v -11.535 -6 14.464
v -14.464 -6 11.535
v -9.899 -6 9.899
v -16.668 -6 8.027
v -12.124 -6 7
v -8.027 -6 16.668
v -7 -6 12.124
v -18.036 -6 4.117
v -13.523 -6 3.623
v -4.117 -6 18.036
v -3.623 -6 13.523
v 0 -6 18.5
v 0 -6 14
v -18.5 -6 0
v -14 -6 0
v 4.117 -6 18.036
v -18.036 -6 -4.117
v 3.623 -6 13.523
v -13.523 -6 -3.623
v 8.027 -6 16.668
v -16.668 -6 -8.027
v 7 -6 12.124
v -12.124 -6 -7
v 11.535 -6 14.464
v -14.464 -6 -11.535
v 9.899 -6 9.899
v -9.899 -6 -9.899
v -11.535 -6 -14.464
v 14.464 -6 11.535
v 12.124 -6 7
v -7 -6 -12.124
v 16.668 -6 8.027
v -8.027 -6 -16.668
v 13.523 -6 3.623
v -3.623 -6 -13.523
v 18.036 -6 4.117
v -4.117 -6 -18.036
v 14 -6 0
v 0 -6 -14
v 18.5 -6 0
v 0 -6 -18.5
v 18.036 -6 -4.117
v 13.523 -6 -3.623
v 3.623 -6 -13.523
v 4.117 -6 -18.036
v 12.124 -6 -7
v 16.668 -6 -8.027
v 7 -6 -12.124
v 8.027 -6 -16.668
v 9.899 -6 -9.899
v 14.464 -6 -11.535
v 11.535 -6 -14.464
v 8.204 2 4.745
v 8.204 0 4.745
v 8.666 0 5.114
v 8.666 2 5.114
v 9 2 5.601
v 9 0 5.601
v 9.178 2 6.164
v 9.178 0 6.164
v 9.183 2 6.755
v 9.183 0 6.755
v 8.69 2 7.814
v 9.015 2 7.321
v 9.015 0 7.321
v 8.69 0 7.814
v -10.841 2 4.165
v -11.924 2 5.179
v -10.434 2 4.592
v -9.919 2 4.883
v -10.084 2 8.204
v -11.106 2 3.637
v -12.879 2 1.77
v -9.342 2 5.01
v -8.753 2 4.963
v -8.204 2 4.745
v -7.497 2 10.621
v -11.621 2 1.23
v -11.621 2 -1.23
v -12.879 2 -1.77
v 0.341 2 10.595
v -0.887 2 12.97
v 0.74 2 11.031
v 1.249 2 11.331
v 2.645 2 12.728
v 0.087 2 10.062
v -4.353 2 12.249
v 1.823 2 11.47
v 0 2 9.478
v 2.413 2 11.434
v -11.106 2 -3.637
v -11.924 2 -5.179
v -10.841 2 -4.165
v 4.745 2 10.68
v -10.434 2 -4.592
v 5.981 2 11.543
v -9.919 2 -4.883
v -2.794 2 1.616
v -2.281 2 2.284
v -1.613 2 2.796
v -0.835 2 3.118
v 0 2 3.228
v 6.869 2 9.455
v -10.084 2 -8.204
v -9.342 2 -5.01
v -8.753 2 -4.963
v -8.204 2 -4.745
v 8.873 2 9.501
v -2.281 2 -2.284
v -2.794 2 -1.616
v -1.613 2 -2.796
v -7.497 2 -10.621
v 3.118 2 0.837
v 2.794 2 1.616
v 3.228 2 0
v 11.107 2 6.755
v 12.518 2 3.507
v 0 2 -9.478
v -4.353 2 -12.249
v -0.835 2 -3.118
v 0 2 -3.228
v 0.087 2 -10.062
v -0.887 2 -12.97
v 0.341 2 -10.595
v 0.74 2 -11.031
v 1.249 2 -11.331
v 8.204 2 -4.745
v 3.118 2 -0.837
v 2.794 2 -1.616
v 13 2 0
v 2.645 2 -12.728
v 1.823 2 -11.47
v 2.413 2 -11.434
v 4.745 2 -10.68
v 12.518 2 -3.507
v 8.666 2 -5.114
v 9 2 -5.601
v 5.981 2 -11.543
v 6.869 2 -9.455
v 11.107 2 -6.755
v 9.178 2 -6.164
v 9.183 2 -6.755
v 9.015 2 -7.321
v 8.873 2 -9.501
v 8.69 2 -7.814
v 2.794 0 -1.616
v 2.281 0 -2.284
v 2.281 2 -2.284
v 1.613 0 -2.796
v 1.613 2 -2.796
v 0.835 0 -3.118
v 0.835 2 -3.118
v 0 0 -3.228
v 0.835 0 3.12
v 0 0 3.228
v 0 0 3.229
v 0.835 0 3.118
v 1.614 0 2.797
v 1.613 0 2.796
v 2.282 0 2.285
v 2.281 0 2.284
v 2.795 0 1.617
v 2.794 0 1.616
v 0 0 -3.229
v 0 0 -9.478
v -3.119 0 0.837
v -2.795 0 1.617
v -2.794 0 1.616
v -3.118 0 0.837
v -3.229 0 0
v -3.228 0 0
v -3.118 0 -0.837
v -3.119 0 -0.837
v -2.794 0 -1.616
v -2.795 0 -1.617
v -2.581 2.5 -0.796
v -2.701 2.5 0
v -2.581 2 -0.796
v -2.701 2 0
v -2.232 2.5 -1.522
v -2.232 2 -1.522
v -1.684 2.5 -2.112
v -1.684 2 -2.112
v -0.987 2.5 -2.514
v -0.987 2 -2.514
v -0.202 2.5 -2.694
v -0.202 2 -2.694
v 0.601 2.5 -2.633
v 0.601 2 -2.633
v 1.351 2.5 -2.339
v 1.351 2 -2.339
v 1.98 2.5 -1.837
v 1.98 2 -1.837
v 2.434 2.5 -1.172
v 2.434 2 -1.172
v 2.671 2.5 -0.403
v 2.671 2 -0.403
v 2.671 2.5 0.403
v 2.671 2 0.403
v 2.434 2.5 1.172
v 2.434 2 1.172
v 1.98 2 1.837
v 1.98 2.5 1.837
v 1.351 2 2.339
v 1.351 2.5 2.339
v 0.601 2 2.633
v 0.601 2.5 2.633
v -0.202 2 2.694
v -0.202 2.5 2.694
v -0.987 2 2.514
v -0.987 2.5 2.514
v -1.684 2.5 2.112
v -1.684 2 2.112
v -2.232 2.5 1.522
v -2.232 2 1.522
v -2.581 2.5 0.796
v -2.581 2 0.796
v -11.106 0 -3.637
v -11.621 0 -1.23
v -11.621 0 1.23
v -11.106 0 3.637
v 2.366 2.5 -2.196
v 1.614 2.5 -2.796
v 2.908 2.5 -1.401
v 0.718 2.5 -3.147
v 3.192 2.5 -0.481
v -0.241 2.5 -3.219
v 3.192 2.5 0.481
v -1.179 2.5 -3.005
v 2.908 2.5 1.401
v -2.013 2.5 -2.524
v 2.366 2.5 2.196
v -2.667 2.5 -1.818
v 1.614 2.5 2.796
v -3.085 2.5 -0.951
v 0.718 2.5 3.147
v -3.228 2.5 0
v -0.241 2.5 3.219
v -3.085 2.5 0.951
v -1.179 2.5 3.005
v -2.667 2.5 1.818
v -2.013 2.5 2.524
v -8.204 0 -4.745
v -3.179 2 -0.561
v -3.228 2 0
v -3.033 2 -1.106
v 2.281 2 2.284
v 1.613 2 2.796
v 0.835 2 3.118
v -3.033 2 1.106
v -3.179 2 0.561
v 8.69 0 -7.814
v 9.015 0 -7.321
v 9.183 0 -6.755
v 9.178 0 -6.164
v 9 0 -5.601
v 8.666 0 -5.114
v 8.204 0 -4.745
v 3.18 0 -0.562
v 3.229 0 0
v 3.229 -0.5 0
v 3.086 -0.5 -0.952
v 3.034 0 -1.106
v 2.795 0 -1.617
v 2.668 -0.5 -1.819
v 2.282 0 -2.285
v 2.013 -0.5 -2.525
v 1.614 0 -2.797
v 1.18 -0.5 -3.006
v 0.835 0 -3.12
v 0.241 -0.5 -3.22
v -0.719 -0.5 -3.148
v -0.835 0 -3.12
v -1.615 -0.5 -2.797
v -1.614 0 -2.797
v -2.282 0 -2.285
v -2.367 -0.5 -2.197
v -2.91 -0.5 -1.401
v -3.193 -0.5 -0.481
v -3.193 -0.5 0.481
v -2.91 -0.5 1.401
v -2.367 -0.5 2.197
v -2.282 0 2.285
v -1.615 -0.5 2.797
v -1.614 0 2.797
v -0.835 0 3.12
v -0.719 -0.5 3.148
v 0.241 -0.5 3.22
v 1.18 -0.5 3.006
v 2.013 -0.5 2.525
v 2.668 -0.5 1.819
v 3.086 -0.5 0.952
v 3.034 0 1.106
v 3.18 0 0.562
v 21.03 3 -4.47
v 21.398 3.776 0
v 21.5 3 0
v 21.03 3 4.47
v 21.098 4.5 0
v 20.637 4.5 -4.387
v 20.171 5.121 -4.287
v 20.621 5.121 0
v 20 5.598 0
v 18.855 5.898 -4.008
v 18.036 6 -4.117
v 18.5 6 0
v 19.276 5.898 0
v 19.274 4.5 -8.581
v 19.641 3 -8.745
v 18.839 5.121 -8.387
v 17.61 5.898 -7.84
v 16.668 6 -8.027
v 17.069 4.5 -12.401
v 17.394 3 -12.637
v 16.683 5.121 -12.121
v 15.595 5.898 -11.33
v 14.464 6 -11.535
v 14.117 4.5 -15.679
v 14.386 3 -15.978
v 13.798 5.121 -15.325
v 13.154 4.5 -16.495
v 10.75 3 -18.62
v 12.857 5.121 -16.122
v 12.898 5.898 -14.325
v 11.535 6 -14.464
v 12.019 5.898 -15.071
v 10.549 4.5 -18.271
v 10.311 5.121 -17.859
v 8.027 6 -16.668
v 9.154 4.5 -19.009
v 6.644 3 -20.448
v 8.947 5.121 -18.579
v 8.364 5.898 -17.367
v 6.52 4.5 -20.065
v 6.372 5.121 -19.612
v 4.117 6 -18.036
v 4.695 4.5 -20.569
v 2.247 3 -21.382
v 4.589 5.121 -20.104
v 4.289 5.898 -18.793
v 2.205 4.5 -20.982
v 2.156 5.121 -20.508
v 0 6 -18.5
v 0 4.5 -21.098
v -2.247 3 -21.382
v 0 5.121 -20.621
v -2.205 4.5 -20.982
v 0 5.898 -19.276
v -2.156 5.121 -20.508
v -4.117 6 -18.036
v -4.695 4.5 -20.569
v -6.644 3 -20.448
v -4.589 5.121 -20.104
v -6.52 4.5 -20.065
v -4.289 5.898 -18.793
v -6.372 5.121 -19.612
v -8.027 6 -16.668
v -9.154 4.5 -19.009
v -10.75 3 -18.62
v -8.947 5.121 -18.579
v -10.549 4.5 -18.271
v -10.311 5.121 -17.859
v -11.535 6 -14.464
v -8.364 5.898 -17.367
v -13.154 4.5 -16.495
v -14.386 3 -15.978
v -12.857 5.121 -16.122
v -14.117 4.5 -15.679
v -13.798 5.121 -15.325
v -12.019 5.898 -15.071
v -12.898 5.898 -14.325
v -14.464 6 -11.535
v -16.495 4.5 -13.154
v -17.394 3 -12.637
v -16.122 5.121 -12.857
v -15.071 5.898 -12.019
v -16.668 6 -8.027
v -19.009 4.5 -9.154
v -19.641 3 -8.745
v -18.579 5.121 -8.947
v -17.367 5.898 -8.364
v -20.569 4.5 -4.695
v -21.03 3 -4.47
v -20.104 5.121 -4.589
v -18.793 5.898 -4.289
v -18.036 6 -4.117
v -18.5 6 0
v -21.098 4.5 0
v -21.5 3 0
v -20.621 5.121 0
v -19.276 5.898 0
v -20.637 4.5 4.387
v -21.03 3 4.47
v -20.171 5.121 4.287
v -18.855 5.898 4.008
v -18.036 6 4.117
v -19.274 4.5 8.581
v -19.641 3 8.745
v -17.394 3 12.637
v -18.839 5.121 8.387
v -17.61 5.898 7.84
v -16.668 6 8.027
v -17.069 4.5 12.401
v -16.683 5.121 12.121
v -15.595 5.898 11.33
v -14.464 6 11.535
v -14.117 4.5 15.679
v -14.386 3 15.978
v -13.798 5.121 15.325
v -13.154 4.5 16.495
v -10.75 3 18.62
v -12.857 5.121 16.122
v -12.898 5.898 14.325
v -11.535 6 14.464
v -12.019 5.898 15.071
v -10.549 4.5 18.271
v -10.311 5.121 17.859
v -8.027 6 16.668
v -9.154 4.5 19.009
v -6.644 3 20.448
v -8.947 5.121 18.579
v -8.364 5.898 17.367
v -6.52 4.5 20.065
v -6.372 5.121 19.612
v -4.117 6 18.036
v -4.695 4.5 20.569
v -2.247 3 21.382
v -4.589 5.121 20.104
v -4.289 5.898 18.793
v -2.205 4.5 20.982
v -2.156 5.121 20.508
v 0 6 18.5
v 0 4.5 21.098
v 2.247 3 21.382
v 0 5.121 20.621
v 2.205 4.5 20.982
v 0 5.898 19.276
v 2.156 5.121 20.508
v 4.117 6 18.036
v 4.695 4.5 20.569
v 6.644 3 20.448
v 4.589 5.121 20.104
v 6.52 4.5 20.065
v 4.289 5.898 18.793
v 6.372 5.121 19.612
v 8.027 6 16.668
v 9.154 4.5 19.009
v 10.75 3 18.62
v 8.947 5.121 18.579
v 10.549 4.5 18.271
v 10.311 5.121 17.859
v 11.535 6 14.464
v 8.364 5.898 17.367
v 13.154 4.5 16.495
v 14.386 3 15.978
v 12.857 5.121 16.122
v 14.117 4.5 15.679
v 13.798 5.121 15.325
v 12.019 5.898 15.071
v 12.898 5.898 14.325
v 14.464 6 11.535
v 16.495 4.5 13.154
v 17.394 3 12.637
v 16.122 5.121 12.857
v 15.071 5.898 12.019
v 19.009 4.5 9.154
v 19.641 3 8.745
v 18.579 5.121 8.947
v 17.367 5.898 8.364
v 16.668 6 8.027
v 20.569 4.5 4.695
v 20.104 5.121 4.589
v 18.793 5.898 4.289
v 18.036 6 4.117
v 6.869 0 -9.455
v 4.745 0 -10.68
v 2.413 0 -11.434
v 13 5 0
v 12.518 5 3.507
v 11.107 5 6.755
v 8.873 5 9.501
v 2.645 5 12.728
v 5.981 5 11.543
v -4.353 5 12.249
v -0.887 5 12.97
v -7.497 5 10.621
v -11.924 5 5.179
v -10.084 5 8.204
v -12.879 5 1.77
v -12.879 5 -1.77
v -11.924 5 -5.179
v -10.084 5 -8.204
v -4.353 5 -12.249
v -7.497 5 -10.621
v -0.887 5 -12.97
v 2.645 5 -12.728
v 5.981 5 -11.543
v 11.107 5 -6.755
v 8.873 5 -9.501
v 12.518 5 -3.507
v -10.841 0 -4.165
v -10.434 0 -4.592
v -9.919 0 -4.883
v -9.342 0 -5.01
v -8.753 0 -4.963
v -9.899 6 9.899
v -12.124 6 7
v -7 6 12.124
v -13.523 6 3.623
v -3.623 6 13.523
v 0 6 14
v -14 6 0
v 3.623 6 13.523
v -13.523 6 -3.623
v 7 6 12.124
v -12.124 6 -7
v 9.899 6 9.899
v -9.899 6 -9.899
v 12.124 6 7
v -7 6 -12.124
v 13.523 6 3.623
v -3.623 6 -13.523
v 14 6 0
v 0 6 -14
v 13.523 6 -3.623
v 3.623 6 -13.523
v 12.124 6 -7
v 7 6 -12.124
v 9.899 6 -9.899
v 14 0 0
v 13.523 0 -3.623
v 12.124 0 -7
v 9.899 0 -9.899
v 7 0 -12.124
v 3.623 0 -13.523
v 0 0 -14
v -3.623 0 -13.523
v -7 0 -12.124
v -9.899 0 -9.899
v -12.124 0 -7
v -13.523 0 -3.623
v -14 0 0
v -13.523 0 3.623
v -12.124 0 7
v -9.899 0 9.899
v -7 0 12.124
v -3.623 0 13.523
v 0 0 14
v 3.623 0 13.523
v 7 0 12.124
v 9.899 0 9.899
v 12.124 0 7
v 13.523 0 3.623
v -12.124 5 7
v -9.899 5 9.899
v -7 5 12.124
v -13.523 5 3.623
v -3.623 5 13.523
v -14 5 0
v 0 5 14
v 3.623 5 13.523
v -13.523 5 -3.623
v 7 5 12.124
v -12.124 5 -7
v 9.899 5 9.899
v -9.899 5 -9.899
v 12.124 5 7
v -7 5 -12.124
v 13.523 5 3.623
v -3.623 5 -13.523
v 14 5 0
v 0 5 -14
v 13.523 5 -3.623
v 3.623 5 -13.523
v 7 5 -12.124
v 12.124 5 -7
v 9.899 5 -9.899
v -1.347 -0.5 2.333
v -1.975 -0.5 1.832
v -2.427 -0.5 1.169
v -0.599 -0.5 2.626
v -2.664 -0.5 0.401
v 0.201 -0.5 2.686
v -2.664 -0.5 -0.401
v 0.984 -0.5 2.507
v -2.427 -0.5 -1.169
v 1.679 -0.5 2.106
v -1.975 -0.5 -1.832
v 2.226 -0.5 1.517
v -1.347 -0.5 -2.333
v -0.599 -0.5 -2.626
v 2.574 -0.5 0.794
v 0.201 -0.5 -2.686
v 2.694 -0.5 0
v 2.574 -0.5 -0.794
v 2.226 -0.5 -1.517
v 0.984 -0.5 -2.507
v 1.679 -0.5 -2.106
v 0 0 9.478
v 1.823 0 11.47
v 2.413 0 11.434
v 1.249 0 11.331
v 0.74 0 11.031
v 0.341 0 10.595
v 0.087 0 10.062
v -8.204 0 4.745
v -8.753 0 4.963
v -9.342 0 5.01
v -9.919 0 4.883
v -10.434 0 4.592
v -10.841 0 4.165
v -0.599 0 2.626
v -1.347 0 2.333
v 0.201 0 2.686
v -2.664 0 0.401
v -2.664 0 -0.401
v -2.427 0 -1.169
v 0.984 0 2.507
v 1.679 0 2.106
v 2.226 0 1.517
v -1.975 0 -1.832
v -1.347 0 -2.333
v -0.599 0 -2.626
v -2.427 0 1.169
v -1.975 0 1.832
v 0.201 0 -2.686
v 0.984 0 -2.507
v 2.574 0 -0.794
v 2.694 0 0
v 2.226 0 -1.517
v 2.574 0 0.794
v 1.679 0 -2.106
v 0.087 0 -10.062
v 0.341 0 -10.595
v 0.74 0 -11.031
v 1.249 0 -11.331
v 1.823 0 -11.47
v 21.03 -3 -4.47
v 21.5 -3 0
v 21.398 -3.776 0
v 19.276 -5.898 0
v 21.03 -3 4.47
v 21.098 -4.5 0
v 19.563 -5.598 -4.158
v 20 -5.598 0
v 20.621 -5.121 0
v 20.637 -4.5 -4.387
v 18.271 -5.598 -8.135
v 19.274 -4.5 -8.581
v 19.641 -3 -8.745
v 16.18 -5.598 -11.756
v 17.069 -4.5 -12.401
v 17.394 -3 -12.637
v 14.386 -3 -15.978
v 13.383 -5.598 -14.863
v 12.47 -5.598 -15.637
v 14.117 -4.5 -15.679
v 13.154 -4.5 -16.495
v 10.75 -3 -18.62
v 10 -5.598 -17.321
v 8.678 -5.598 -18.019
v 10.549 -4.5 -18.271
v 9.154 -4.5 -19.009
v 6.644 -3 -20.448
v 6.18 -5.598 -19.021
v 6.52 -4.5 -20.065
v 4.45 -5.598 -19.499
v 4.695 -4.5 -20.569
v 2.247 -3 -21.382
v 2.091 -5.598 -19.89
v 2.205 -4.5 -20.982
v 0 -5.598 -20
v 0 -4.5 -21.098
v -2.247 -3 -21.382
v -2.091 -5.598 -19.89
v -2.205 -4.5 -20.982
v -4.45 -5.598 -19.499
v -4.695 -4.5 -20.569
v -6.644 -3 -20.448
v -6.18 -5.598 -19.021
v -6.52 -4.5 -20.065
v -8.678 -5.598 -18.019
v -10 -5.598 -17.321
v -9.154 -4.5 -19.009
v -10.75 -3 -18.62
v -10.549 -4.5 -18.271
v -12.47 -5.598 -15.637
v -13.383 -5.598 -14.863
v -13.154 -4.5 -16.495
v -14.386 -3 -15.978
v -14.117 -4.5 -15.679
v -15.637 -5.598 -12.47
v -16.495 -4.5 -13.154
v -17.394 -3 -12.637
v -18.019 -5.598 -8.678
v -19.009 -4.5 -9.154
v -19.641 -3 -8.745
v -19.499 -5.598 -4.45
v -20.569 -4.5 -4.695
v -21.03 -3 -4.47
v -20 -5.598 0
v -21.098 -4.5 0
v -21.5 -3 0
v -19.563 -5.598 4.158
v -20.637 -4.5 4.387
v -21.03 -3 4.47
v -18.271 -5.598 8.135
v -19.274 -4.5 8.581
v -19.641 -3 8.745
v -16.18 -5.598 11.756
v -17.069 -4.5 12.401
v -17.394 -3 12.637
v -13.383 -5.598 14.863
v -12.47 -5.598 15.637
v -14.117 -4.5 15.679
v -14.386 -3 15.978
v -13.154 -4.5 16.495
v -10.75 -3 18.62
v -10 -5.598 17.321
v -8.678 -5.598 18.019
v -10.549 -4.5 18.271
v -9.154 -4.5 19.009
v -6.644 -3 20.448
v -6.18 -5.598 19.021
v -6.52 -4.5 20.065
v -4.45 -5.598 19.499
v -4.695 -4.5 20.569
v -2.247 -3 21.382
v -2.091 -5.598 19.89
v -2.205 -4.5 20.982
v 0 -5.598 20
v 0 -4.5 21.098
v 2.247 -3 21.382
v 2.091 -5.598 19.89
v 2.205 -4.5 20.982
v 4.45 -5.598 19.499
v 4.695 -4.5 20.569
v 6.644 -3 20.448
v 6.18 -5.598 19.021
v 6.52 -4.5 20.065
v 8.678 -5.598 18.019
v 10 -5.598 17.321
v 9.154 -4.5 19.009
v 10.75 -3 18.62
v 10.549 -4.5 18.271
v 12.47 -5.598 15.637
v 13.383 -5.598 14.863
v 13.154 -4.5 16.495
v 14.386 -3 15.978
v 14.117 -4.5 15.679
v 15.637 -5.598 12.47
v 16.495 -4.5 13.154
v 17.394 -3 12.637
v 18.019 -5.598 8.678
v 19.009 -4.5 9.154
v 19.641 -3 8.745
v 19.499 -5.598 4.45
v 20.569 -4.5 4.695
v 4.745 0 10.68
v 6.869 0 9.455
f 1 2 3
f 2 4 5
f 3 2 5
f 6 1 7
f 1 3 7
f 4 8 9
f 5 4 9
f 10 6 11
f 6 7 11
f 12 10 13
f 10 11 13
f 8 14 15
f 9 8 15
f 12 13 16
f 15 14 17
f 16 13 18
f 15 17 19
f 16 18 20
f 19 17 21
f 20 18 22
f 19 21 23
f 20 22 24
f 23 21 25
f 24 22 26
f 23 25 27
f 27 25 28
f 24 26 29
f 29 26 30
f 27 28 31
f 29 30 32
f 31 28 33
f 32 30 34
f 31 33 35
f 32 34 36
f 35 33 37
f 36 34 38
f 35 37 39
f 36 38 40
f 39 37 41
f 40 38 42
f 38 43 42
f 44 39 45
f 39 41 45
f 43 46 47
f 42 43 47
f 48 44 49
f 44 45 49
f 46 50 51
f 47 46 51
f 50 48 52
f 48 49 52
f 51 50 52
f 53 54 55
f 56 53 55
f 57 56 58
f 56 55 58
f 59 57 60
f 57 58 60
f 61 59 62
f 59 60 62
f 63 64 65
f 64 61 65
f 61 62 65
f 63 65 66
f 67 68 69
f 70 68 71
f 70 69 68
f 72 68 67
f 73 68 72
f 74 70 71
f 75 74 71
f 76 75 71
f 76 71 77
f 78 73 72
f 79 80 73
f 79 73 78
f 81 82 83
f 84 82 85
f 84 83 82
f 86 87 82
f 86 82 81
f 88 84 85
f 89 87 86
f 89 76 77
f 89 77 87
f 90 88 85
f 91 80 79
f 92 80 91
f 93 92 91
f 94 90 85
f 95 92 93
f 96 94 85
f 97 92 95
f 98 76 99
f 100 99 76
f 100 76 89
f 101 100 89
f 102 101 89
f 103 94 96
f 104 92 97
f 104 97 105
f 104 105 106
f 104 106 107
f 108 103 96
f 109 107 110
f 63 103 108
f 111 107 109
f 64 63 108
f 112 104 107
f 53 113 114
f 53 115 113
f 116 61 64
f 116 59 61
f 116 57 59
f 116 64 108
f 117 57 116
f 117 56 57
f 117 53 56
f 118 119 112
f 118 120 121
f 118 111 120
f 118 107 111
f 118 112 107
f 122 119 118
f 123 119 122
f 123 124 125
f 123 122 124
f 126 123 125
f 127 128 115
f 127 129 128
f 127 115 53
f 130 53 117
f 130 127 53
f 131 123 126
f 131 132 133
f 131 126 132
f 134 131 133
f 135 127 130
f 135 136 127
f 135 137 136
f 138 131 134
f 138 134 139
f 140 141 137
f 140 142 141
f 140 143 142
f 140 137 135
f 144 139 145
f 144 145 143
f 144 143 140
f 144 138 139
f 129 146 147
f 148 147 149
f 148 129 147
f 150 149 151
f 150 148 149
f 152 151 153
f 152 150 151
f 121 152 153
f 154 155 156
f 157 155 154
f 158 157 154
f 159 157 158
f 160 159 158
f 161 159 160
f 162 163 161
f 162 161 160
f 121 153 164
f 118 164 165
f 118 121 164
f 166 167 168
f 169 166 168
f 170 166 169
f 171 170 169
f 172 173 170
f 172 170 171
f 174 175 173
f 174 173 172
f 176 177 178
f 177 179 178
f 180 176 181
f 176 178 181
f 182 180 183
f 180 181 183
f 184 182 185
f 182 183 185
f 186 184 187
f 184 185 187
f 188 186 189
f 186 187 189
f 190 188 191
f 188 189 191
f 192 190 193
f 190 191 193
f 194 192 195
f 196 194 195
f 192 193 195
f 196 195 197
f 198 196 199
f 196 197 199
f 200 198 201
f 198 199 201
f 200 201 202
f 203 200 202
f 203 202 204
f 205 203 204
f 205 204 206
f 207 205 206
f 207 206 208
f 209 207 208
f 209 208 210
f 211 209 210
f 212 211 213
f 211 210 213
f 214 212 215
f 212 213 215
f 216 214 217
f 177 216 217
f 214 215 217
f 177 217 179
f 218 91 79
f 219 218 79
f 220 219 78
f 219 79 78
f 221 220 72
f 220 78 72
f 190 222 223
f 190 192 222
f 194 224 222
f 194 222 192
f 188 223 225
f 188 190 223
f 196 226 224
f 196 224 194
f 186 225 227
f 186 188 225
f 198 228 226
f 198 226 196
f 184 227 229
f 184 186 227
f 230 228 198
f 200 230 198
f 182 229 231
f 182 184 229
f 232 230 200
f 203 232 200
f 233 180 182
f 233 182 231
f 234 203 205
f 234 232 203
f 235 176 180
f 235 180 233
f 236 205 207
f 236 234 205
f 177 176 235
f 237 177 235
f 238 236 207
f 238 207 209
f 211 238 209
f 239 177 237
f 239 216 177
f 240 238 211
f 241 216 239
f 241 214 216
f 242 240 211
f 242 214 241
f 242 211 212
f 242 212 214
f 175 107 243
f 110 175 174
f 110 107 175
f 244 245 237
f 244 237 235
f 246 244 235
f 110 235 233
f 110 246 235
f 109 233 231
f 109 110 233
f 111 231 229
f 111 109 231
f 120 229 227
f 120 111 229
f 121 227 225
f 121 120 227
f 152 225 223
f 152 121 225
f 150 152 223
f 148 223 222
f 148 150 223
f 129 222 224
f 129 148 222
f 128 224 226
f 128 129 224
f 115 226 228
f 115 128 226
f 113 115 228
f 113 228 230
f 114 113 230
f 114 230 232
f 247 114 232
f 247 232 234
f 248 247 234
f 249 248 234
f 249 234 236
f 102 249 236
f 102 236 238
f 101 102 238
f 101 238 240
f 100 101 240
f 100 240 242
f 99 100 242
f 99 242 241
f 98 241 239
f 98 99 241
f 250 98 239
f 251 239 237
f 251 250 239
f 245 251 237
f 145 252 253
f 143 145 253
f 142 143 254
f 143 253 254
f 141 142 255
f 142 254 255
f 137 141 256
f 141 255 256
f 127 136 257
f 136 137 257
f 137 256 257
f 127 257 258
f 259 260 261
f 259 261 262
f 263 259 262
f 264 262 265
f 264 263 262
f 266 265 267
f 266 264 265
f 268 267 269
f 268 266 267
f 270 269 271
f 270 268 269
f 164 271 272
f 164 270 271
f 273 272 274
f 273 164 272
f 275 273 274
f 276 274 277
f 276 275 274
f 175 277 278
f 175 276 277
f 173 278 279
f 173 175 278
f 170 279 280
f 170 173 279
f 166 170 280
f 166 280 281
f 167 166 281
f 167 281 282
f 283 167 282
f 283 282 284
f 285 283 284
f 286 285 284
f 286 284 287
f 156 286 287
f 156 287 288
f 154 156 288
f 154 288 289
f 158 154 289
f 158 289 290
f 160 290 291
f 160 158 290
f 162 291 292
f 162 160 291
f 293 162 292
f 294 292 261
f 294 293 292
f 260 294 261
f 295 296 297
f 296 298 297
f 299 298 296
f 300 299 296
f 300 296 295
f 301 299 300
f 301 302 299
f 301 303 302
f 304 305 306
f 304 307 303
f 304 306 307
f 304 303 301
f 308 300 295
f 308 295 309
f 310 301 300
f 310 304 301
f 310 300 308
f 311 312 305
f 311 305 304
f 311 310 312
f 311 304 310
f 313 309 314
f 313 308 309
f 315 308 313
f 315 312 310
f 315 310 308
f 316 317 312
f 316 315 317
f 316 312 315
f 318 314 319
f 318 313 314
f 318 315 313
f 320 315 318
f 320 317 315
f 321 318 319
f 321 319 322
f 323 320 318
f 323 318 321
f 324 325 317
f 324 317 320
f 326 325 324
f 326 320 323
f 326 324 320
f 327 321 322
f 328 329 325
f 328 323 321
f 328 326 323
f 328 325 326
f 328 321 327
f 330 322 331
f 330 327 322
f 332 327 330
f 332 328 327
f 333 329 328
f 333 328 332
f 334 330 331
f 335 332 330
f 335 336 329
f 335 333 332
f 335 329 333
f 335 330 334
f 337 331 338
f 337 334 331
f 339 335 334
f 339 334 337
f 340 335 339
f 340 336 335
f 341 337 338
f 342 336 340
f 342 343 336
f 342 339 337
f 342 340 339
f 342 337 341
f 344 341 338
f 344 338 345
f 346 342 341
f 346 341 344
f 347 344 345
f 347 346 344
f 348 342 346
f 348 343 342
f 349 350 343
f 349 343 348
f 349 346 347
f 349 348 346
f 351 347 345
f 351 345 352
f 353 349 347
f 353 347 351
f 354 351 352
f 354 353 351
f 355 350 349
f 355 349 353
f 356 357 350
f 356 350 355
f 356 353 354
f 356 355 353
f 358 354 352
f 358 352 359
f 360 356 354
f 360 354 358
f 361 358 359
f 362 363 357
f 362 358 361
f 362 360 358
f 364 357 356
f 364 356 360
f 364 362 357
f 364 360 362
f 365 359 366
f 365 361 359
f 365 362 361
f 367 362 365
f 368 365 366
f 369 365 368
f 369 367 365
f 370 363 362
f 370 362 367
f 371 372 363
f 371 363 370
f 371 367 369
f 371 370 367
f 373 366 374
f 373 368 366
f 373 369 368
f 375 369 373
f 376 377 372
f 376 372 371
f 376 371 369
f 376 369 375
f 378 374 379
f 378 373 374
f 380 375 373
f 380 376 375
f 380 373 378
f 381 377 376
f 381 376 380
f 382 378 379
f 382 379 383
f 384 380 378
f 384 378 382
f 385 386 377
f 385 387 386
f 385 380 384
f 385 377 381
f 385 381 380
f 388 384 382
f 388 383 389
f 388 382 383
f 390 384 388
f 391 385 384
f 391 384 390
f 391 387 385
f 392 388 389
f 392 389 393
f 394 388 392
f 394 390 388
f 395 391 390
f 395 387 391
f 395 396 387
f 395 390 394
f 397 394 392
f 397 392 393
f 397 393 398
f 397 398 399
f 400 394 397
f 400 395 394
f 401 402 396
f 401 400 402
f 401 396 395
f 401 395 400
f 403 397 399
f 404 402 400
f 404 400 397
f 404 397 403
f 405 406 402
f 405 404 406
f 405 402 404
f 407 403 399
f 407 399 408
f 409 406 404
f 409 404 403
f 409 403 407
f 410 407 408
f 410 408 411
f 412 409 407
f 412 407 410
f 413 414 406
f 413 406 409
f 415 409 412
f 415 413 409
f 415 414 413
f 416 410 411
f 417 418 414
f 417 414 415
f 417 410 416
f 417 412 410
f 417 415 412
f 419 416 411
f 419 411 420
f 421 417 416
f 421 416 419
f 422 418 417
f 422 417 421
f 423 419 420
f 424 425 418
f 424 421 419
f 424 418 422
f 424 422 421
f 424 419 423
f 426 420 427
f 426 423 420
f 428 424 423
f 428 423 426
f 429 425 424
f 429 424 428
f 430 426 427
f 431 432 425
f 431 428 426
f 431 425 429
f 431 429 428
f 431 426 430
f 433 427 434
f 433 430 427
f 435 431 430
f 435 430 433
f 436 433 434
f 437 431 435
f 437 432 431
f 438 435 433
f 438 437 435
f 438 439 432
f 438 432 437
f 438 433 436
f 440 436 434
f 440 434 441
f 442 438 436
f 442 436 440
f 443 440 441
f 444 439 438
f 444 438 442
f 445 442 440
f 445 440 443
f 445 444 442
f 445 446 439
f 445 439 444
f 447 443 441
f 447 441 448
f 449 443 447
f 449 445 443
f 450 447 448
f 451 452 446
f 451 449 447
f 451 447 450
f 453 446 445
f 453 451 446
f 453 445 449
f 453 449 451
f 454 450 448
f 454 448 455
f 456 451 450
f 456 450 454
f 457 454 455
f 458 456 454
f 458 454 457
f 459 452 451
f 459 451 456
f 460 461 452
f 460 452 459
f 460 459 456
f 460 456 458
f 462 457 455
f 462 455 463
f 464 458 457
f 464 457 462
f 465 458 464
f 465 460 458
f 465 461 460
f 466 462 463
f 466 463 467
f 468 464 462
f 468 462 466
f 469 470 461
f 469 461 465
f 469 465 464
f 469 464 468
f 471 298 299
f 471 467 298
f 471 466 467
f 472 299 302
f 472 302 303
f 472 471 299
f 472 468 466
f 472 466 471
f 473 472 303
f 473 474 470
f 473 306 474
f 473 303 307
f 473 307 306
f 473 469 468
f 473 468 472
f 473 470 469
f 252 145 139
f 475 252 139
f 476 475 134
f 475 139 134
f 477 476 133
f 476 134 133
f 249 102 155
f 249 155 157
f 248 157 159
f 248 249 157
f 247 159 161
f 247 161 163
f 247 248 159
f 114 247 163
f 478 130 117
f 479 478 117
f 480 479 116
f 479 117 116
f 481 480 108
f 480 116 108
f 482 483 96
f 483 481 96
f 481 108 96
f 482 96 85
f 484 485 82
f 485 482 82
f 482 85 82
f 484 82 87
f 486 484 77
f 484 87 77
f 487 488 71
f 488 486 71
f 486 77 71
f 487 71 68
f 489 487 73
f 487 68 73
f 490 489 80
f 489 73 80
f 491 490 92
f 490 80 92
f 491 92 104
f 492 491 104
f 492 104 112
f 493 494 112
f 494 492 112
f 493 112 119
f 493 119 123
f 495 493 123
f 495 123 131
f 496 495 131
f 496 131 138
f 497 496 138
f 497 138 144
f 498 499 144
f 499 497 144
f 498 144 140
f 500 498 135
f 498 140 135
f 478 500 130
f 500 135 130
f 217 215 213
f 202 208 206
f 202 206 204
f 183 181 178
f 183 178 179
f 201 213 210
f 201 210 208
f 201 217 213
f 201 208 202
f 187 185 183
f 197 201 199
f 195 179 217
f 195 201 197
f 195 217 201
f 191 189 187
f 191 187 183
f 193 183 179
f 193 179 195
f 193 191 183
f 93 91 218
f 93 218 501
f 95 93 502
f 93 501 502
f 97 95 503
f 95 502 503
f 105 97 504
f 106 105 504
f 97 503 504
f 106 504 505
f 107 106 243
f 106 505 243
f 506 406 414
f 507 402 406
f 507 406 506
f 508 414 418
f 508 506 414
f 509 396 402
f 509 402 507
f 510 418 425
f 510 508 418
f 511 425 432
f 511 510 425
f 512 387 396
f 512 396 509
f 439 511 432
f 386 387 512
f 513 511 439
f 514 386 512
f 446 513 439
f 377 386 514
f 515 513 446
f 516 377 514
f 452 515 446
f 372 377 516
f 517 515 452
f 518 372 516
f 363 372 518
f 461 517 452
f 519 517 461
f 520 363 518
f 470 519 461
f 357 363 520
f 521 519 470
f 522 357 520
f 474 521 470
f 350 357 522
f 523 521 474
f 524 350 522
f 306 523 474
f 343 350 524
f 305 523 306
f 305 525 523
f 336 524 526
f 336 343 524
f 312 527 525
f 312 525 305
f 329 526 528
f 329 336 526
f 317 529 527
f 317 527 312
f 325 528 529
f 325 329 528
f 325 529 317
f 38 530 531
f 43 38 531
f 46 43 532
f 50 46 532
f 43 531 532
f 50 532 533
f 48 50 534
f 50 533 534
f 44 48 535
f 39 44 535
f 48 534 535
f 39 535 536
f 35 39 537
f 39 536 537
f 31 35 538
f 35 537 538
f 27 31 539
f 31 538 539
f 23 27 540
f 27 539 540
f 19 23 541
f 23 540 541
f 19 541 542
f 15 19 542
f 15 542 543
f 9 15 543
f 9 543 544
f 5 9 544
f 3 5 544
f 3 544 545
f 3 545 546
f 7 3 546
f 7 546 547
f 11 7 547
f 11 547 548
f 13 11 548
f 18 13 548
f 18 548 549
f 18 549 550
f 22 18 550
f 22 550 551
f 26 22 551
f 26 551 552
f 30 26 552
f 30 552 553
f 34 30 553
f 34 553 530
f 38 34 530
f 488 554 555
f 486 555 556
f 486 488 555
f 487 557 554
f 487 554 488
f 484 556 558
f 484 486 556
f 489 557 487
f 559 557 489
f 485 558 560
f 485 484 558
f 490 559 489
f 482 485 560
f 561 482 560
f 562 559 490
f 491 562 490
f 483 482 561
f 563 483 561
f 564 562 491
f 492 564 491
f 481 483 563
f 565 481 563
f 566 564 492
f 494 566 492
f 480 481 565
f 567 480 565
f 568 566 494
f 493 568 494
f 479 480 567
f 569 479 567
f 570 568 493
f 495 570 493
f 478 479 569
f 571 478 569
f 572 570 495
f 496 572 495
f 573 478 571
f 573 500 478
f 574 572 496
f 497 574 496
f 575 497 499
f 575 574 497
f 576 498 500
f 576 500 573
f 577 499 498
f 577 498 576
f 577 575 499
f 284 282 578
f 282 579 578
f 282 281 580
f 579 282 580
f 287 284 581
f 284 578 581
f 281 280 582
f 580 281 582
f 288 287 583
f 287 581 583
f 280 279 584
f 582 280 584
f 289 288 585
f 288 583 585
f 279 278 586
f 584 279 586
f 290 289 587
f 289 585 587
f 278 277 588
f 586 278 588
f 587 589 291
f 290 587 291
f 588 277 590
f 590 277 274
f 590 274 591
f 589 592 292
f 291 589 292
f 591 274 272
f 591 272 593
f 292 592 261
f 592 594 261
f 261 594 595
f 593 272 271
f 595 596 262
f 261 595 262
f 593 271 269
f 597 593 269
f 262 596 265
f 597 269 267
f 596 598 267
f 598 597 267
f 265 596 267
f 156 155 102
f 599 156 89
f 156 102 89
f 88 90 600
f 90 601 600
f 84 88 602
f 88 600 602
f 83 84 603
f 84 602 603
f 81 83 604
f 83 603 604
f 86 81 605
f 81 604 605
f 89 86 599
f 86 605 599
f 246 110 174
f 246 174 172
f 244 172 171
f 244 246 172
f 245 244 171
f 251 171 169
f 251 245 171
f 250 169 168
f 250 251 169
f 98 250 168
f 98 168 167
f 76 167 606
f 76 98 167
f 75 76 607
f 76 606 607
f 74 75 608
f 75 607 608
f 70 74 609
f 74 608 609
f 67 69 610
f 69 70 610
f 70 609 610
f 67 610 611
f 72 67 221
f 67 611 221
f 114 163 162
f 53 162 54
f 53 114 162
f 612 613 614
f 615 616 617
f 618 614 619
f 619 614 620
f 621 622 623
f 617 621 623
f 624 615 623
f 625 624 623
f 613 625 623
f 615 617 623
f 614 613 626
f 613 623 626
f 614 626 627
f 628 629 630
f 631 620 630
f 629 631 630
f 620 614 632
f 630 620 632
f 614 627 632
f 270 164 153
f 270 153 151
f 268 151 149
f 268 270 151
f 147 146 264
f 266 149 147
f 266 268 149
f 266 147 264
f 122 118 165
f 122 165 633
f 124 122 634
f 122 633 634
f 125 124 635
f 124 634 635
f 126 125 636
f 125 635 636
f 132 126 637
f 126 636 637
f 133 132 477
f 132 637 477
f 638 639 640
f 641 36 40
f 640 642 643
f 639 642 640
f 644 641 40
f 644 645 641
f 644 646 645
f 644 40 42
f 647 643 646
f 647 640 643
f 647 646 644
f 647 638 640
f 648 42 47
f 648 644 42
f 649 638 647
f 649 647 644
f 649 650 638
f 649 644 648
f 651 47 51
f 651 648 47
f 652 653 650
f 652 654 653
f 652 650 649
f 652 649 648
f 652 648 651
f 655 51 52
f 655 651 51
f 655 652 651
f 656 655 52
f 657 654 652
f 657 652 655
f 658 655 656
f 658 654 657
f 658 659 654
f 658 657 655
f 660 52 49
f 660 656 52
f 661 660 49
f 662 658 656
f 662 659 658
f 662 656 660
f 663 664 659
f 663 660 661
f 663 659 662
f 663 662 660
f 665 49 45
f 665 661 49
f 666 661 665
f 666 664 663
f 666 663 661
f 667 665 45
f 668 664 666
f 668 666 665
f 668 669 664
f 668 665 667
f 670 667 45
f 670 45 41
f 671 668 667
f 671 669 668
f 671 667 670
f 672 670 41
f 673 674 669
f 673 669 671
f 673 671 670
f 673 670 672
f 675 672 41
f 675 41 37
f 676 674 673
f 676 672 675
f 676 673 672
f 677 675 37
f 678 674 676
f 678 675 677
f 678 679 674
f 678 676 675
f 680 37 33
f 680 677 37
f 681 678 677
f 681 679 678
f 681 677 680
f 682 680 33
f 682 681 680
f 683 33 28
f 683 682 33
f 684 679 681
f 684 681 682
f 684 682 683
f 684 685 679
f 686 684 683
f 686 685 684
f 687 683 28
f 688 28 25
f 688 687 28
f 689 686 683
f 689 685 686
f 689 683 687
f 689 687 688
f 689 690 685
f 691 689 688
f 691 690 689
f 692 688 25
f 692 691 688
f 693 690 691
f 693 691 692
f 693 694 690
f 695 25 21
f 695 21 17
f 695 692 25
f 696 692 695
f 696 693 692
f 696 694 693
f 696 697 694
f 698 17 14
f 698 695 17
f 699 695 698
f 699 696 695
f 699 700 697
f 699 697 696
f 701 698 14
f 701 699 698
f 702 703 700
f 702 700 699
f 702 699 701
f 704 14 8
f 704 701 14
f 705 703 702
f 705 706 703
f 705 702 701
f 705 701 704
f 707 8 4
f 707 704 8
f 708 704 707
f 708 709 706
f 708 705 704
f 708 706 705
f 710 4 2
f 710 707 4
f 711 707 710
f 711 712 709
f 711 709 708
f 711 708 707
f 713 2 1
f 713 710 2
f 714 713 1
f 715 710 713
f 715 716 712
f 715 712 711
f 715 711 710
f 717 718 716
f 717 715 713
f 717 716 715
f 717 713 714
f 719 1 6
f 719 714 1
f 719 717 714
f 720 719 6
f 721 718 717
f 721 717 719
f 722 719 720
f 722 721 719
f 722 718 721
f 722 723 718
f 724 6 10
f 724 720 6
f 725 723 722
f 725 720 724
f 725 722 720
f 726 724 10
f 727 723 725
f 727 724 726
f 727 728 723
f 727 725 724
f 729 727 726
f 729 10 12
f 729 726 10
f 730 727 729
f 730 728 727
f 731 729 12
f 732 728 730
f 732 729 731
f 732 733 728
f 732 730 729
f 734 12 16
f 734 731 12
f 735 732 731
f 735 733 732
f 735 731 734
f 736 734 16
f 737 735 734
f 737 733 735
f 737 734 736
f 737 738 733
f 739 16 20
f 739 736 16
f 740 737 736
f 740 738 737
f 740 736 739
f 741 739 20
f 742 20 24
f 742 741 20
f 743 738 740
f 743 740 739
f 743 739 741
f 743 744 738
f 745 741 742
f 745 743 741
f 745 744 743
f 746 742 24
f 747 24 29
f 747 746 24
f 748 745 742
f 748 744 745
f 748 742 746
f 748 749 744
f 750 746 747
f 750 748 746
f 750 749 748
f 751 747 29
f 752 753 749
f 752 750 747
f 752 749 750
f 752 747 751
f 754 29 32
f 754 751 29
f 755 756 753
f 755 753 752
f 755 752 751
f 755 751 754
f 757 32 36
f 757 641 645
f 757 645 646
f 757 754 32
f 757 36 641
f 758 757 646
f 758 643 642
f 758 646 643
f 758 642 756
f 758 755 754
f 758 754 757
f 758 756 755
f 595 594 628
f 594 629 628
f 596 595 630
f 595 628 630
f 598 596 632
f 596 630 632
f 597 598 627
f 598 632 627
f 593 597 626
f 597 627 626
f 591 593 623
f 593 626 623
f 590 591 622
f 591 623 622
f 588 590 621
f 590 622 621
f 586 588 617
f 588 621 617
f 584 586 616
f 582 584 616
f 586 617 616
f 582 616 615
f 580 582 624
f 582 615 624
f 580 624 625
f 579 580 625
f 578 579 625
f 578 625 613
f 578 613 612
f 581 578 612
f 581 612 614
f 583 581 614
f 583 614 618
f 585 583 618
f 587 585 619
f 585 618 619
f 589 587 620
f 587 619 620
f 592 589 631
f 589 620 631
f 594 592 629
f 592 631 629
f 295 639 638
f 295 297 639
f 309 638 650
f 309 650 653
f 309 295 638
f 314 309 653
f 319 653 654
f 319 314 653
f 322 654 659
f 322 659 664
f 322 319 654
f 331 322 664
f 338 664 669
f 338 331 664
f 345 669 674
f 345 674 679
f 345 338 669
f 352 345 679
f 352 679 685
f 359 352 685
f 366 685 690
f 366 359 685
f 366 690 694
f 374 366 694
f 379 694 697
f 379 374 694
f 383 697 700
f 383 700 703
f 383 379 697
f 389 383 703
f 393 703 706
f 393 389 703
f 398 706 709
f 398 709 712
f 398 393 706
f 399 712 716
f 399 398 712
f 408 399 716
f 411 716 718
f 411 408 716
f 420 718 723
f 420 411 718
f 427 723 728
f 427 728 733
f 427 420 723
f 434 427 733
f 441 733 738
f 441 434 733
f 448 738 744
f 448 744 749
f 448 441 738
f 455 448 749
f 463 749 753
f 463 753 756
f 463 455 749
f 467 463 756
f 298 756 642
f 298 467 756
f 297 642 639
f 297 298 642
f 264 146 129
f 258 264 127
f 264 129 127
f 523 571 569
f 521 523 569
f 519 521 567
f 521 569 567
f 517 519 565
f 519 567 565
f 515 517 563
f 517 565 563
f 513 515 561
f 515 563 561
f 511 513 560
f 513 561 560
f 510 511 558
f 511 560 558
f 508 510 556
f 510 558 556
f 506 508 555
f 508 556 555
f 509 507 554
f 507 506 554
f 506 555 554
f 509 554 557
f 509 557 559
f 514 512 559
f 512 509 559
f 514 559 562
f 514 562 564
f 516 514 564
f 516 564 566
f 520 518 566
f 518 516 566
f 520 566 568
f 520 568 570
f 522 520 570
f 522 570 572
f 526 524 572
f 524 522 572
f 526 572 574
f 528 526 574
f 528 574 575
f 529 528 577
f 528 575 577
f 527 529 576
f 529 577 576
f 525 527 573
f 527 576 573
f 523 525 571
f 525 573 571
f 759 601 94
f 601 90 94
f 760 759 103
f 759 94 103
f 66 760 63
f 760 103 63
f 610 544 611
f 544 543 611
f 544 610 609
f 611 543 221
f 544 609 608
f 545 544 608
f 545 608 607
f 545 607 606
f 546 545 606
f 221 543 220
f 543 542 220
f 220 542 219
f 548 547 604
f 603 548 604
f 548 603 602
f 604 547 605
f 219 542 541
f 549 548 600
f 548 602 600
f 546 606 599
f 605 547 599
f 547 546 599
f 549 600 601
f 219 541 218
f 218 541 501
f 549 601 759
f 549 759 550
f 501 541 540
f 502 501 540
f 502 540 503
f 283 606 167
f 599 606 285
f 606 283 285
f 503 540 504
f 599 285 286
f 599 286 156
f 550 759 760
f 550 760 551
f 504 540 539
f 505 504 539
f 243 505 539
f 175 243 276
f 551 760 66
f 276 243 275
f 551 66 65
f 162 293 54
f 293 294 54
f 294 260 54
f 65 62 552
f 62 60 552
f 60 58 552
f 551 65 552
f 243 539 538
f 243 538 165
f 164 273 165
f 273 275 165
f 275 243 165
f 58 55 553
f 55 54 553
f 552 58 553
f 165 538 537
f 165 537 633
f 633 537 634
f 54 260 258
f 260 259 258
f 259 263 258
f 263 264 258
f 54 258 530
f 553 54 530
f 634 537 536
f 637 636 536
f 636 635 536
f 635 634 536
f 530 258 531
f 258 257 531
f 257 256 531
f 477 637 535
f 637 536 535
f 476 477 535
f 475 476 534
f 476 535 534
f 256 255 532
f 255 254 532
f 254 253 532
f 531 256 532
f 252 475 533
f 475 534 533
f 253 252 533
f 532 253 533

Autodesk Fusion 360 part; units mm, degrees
sketch "Sketch1" plane through (0, 0, 0) normal (0, 1, 0) x (1, 0, 0)
  circle A0 centre (0, 0) radius 21.5
  circle A1 centre (0, 0) radius 14
  circle A2 centre (0, 0) radius 13
  dimension "d1" = 43
  dimension "d2" = 28
  dimension "d3" = 26
extrude "Extrude1" add sketch "Sketch1" along normal mid plane 12 contours A0
extrude "Extrude2" add sketch "Sketch1" along normal blind 5 contours A1
extrude "Extrude3" add sketch "Sketch1" along normal blind 2 contours A2
fillet "Fillet1" radius 3 2 edges at (-20.045, 6, 7.7747) (-20.045, -6, -7.7747)
sketch "Sketch2" plane through (0, 2, 0) normal (0, 1, 0) x (-1, 0, 0)
  circle A0 centre (0, 0) radius 13
  line L0 (0, 0) -> (0, -13)
  line L1 (0, 0) -> (-11.253, 6.5092)
  line L2 (0, 0) -> (11.253, 6.5092)
  line L3 (0, 0) -> (-11.253, -6.5092)
  line L4 (0, 0) -> (0, 13)
  line L5 (11.253, -6.5092) -> (-11.253, 6.5092)
  circle A1 centre (0, 0) radius 11.6863
extrude "Extrude4" cut sketch "Sketch2" against normal blind 17 contours L2 L5 A1 | L1 L4 L5 A1 | L0 L3 A1
fillet "Fillet2" radius 2 6 edges at (0, 1, -11.6863) (10.1158, 1, 5.8514) (0, 1, 11.6863) (-10.1158, 1, 5.8514) (10.1158, 1, -5.8514) (-10.1158, 1, -5.8514)
sketch "Sketch3" plane through (0, 2, 0) normal (0, 1, 0) x (-1, 0, 0)
  arc A0 (11.106, -3.6366) -> (11.106, 3.6366) centre (0, 0) ccw
  arc A1 (8.2039, -4.7455) -> (11.106, -3.6366) centre (9.2053, -3.0142) ccw
  line L0 (8.2039, -4.7455) -> (0, 0)
  line L1 (0, 0) -> (0, -9.4775)
  arc A2 (-2.413, -11.4344) -> (0, -9.4775) centre (-2, -9.4775) ccw
  arc A3 (-8.6897, -7.814) -> (-2.413, -11.4344) centre (0, 0) ccw
  arc A4 (-8.2039, -4.7455) -> (-8.6897, -7.814) centre (-7.2025, -6.4767) ccw
  line L2 (-8.2039, -4.7455) -> (0, 0)
  line L3 (0, 0) -> (-8.2039, 4.7455)
  arc A5 (-8.6897, 7.814) -> (-8.2039, 4.7455) centre (-7.2025, 6.4767) ccw
  arc A6 (-2.413, 11.4344) -> (-8.6897, 7.814) centre (0, 0) ccw
  arc A7 (0, 9.4775) -> (-2.413, 11.4344) centre (-2, 9.4775) ccw
  line L4 (0, 9.4775) -> (0, 0)
  line L5 (0, 0) -> (8.2039, 4.7455)
  arc A8 (11.106, 3.6366) -> (8.2039, 4.7455) centre (9.2053, 3.0142) ccw
  circle A9 centre (0, 0) radius 13
  circle A10 centre (0, 0) radius 3.2281
  circle A11 centre (0, 0) radius 2.7011
extrude "Extrude5" add sketch "Sketch3" against normal blind 2 contours L0 L1 A10 A11 | L0 L5 A10 A11 | L4 L5 A10 A11 | L0 L1 A11 | L0 L5 A11 | L1 L2 A10 A11 | L4 L5 A11 | L3 L4 A10 A11 | L1 L2 A11 | L2 L3 A11 | L3 L4 A11 | L2 L3 A10 A11
sketch "Sketch4" plane through (0, 2, 0) normal (0, 1, 0) x (-1, 0, 0)
  line L0 (0, -3.2281) -> (0, -9.4775)
  arc A0 (-2.413, -11.4344) -> (0, -9.4775) centre (-2, -9.4775) ccw
  arc A1 (-8.6897, -7.814) -> (-2.413, -11.4344) centre (0, 0) ccw
  arc A2 (-8.2039, -4.7455) -> (-8.6897, -7.814) centre (-7.2025, -6.4767) ccw
  line L1 (-8.2039, -4.7455) -> (-2.7943, -1.6163)
  arc A3 (-2.7943, -1.6163) -> (0, -3.2281) centre (0, 0) ccw
  line L2 (-2.7943, 1.6163) -> (-8.2039, 4.7455)
  arc A4 (-8.6897, 7.814) -> (-8.2039, 4.7455) centre (-7.2025, 6.4767) ccw
  arc A5 (-2.413, 11.4344) -> (-8.6897, 7.814) centre (0, 0) ccw
  arc A6 (0, 9.4775) -> (-2.413, 11.4344) centre (-2, 9.4775) ccw
  line L3 (0, 9.4775) -> (0, 3.2281)
  arc A7 (0, 3.2281) -> (-2.7943, 1.6163) centre (0, 0) ccw
  arc A8 (2.7943, -1.6163) -> (2.7943, 1.6163) centre (0, 0) ccw
  line L4 (2.7943, 1.6163) -> (8.2039, 4.7455)
  arc A9 (11.106, 3.6366) -> (8.2039, 4.7455) centre (9.2053, 3.0142) ccw
  arc A10 (11.106, -3.6366) -> (11.106, 3.6366) centre (0, 0) ccw
  arc A11 (8.2039, -4.7455) -> (11.106, -3.6366) centre (9.2053, -3.0142) ccw
  line L5 (8.2039, -4.7455) -> (2.7943, -1.6163)
  circle A12 centre (0, 0) radius 13
  circle A13 centre (0, 0) radius 3.25
  circle A14 centre (0, 0) radius 2.7033
  circle A15 centre (0, 0) radius 2.7011
  circle A16 centre (0, 0) radius 3.2281
  circle A17 centre (0, 0) radius 3.25
  dimension "d18" = 6.5
extrude "Extrude6" add sketch "Sketch3" along normal blind 0.5 contours L0 L1 A10 A11 | L0 L5 A10 A11 | L4 L5 A10 A11 | L1 L2 A10 A11 | L3 L4 A10 A11 | L2 L3 A10 A11
sketch "Sketch5" plane through (0, 0, 0) normal (0, 1, 0) x (1, 0, 0)
  circle A0 centre (0, 0) radius 3.2294
  circle A1 centre (0, 0) radius 2.6936
extrude "Extrude7" add sketch "Sketch5" against normal blind 0.5
